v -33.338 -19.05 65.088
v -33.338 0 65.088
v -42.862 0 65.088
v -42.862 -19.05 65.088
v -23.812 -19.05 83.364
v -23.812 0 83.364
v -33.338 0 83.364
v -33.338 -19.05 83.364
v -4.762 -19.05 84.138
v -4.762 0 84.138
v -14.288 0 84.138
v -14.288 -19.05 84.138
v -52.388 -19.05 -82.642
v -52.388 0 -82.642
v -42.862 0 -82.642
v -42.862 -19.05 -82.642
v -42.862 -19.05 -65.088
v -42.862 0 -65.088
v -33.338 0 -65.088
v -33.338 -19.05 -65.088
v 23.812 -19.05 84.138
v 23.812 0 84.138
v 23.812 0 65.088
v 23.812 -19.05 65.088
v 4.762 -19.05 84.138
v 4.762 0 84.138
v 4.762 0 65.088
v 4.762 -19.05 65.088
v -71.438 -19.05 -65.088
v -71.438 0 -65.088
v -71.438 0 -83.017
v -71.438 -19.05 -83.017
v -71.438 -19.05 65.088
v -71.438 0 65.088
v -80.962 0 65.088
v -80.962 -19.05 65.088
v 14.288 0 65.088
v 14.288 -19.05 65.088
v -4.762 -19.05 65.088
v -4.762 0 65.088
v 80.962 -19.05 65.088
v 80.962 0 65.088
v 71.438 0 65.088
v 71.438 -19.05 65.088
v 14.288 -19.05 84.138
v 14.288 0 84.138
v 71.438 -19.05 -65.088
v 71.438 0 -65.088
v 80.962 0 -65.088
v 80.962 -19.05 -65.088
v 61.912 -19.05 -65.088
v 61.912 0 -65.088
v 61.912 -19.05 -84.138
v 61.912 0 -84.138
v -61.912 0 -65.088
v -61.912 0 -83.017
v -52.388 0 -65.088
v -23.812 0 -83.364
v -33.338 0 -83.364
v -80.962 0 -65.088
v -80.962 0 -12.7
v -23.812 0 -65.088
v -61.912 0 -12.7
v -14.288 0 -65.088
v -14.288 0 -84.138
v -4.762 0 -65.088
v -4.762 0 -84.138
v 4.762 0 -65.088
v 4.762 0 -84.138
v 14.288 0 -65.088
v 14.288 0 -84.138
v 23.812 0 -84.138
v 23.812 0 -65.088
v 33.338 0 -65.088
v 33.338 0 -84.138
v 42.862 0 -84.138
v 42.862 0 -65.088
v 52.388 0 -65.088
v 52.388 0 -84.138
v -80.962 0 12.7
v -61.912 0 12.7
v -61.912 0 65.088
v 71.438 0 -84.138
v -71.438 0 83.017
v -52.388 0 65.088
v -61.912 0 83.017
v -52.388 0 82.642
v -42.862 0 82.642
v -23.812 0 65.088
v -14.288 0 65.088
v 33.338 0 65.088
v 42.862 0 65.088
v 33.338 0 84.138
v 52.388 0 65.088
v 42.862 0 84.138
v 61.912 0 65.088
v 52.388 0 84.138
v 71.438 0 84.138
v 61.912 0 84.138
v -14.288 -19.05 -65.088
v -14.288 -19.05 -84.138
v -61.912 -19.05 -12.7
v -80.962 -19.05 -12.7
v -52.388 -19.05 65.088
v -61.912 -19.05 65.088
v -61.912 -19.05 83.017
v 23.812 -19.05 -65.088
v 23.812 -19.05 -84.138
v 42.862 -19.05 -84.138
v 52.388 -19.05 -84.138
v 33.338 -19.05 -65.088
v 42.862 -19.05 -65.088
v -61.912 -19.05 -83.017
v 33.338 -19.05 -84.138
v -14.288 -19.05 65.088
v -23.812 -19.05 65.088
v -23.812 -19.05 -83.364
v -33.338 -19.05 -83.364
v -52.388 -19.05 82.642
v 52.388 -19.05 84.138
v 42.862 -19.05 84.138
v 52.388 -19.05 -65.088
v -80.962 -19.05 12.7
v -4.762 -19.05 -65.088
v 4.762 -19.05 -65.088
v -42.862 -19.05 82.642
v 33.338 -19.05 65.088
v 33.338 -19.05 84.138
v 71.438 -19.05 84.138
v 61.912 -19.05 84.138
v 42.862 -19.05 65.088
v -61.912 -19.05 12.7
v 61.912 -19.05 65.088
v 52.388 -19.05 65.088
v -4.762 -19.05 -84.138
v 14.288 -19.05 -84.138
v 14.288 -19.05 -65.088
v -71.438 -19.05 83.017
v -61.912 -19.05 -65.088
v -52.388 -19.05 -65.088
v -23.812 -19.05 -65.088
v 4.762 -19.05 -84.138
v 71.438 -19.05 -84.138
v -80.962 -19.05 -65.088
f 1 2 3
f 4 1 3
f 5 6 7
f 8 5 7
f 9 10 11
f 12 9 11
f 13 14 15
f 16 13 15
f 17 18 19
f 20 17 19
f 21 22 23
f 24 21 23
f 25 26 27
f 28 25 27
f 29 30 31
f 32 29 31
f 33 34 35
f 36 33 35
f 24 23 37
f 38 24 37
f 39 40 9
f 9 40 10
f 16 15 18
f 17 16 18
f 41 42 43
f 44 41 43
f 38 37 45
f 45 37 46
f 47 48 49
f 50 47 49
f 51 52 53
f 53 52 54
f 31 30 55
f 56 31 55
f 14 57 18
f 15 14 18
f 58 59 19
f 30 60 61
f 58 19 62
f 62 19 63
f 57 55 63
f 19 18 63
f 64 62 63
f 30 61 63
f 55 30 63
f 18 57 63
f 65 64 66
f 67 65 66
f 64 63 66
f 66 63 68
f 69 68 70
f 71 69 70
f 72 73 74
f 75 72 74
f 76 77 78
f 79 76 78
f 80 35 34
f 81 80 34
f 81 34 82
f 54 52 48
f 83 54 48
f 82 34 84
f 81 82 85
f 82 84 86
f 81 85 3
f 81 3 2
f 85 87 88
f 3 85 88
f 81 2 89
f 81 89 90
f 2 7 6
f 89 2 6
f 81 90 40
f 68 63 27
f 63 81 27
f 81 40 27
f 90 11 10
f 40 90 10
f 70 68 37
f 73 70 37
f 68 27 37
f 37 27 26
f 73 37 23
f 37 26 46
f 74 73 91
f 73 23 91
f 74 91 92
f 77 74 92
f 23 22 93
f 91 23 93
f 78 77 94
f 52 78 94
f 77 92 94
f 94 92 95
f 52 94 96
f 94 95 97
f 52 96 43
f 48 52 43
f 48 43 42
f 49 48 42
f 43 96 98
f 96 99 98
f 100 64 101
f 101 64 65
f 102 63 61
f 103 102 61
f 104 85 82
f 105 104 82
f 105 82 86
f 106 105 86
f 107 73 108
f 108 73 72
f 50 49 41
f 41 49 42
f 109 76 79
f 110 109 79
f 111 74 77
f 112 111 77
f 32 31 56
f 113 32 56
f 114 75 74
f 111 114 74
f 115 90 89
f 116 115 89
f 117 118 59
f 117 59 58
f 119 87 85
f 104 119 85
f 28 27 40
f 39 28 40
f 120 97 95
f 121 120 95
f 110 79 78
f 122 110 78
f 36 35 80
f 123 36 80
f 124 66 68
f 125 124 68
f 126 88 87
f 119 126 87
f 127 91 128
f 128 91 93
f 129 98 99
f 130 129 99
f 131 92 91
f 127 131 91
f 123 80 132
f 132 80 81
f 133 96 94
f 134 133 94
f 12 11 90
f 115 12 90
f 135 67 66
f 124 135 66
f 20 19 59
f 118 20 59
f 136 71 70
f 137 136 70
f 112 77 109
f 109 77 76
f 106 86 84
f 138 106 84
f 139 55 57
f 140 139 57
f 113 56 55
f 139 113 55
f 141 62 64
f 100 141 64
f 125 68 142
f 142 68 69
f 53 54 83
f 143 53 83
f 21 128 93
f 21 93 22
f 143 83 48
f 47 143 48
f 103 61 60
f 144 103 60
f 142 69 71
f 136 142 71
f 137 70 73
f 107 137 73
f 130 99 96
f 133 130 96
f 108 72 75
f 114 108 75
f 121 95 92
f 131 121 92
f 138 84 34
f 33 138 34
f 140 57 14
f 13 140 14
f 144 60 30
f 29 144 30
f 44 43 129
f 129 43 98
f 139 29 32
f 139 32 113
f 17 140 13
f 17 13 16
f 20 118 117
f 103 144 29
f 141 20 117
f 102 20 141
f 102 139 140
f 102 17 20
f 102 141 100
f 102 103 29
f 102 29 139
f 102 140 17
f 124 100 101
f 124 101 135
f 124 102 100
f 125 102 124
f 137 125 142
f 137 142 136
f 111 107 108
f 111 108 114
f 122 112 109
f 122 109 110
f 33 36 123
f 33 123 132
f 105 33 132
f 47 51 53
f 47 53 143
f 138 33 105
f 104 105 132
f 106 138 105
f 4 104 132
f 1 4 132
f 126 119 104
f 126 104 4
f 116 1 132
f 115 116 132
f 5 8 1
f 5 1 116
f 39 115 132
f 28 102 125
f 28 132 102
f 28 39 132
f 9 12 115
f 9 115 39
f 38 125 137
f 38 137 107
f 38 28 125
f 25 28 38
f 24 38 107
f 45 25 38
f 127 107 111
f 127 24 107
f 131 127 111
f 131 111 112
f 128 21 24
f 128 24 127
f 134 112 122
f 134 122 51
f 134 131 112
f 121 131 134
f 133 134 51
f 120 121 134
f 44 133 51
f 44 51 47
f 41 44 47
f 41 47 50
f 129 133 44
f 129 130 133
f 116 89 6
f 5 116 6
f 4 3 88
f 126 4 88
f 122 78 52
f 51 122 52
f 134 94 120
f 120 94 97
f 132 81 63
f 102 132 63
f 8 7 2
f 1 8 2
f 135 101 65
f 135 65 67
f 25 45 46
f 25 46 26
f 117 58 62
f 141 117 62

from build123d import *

# Parameters (mm, degrees)
F1_DEPTH = 19.05


with BuildPart() as f1:
    # F0 (on Front) → F1 (new body)
    with BuildSketch(Plane.XZ):
        Polygon((80.9625, -65.0875), (80.9625, 65.0875), (71.4375, 65.0875), (71.4375, 84.1375), (61.9125, 84.1375), (61.9125, 65.0875), (52.3875, 65.0875), (52.3875, 84.1375), (42.8625, 84.1375), (42.8625, 65.0875), (33.3375, 65.0875), (33.3375, 84.1375), (23.8125, 84.1375), (23.8125, 65.0875), (14.2875, 65.0875), (14.2875, 84.1375), (4.7625, 84.1375), (4.7625, 65.0875), (-4.7625, 65.0875), (-4.7625, 84.1375), (-14.2875, 84.1375), (-14.2875, 65.0875), (-23.8125, 65.0875), (-23.8125, 83.364271), (-33.3375, 83.364271), (-33.3375, 65.0875), (-42.8625, 65.0875), (-42.8625, 82.642086), (-52.3875, 82.642086), (-52.3875, 65.0875), (-61.9125, 65.0875), (-61.9125, 83.017498), (-71.4375, 83.017498), (-71.4375, 65.0875), (-80.9625, 65.0875), (-80.9625, 12.7), (-61.9125, 12.7), (-61.9125, -12.7), (-80.9625, -12.7), (-80.9625, -65.0875), (-71.4375, -65.0875), (-71.4375, -83.017498), (-61.9125, -83.017498), (-61.9125, -65.0875), (-52.3875, -65.0875), (-52.3875, -82.642086), (-42.8625, -82.642086), (-42.8625, -65.0875), (-33.3375, -65.0875), (-33.3375, -83.364271), (-23.8125, -83.364271), (-23.8125, -65.0875), (-14.2875, -65.0875), (-14.2875, -84.1375), (-4.7625, -84.1375), (-4.7625, -65.0875), (4.7625, -65.0875), (4.7625, -84.1375), (14.2875, -84.1375), (14.2875, -65.0875), (23.8125, -65.0875), (23.8125, -84.1375), (33.3375, -84.1375), (33.3375, -65.0875), (42.8625, -65.0875), (42.8625, -84.1375), (52.3875, -84.1375), (52.3875, -65.0875), (61.9125, -65.0875), (61.9125, -84.1375), (71.4375, -84.1375), (71.4375, -65.0875), align=None)
    extrude(amount=F1_DEPTH)


solid = f1.part
